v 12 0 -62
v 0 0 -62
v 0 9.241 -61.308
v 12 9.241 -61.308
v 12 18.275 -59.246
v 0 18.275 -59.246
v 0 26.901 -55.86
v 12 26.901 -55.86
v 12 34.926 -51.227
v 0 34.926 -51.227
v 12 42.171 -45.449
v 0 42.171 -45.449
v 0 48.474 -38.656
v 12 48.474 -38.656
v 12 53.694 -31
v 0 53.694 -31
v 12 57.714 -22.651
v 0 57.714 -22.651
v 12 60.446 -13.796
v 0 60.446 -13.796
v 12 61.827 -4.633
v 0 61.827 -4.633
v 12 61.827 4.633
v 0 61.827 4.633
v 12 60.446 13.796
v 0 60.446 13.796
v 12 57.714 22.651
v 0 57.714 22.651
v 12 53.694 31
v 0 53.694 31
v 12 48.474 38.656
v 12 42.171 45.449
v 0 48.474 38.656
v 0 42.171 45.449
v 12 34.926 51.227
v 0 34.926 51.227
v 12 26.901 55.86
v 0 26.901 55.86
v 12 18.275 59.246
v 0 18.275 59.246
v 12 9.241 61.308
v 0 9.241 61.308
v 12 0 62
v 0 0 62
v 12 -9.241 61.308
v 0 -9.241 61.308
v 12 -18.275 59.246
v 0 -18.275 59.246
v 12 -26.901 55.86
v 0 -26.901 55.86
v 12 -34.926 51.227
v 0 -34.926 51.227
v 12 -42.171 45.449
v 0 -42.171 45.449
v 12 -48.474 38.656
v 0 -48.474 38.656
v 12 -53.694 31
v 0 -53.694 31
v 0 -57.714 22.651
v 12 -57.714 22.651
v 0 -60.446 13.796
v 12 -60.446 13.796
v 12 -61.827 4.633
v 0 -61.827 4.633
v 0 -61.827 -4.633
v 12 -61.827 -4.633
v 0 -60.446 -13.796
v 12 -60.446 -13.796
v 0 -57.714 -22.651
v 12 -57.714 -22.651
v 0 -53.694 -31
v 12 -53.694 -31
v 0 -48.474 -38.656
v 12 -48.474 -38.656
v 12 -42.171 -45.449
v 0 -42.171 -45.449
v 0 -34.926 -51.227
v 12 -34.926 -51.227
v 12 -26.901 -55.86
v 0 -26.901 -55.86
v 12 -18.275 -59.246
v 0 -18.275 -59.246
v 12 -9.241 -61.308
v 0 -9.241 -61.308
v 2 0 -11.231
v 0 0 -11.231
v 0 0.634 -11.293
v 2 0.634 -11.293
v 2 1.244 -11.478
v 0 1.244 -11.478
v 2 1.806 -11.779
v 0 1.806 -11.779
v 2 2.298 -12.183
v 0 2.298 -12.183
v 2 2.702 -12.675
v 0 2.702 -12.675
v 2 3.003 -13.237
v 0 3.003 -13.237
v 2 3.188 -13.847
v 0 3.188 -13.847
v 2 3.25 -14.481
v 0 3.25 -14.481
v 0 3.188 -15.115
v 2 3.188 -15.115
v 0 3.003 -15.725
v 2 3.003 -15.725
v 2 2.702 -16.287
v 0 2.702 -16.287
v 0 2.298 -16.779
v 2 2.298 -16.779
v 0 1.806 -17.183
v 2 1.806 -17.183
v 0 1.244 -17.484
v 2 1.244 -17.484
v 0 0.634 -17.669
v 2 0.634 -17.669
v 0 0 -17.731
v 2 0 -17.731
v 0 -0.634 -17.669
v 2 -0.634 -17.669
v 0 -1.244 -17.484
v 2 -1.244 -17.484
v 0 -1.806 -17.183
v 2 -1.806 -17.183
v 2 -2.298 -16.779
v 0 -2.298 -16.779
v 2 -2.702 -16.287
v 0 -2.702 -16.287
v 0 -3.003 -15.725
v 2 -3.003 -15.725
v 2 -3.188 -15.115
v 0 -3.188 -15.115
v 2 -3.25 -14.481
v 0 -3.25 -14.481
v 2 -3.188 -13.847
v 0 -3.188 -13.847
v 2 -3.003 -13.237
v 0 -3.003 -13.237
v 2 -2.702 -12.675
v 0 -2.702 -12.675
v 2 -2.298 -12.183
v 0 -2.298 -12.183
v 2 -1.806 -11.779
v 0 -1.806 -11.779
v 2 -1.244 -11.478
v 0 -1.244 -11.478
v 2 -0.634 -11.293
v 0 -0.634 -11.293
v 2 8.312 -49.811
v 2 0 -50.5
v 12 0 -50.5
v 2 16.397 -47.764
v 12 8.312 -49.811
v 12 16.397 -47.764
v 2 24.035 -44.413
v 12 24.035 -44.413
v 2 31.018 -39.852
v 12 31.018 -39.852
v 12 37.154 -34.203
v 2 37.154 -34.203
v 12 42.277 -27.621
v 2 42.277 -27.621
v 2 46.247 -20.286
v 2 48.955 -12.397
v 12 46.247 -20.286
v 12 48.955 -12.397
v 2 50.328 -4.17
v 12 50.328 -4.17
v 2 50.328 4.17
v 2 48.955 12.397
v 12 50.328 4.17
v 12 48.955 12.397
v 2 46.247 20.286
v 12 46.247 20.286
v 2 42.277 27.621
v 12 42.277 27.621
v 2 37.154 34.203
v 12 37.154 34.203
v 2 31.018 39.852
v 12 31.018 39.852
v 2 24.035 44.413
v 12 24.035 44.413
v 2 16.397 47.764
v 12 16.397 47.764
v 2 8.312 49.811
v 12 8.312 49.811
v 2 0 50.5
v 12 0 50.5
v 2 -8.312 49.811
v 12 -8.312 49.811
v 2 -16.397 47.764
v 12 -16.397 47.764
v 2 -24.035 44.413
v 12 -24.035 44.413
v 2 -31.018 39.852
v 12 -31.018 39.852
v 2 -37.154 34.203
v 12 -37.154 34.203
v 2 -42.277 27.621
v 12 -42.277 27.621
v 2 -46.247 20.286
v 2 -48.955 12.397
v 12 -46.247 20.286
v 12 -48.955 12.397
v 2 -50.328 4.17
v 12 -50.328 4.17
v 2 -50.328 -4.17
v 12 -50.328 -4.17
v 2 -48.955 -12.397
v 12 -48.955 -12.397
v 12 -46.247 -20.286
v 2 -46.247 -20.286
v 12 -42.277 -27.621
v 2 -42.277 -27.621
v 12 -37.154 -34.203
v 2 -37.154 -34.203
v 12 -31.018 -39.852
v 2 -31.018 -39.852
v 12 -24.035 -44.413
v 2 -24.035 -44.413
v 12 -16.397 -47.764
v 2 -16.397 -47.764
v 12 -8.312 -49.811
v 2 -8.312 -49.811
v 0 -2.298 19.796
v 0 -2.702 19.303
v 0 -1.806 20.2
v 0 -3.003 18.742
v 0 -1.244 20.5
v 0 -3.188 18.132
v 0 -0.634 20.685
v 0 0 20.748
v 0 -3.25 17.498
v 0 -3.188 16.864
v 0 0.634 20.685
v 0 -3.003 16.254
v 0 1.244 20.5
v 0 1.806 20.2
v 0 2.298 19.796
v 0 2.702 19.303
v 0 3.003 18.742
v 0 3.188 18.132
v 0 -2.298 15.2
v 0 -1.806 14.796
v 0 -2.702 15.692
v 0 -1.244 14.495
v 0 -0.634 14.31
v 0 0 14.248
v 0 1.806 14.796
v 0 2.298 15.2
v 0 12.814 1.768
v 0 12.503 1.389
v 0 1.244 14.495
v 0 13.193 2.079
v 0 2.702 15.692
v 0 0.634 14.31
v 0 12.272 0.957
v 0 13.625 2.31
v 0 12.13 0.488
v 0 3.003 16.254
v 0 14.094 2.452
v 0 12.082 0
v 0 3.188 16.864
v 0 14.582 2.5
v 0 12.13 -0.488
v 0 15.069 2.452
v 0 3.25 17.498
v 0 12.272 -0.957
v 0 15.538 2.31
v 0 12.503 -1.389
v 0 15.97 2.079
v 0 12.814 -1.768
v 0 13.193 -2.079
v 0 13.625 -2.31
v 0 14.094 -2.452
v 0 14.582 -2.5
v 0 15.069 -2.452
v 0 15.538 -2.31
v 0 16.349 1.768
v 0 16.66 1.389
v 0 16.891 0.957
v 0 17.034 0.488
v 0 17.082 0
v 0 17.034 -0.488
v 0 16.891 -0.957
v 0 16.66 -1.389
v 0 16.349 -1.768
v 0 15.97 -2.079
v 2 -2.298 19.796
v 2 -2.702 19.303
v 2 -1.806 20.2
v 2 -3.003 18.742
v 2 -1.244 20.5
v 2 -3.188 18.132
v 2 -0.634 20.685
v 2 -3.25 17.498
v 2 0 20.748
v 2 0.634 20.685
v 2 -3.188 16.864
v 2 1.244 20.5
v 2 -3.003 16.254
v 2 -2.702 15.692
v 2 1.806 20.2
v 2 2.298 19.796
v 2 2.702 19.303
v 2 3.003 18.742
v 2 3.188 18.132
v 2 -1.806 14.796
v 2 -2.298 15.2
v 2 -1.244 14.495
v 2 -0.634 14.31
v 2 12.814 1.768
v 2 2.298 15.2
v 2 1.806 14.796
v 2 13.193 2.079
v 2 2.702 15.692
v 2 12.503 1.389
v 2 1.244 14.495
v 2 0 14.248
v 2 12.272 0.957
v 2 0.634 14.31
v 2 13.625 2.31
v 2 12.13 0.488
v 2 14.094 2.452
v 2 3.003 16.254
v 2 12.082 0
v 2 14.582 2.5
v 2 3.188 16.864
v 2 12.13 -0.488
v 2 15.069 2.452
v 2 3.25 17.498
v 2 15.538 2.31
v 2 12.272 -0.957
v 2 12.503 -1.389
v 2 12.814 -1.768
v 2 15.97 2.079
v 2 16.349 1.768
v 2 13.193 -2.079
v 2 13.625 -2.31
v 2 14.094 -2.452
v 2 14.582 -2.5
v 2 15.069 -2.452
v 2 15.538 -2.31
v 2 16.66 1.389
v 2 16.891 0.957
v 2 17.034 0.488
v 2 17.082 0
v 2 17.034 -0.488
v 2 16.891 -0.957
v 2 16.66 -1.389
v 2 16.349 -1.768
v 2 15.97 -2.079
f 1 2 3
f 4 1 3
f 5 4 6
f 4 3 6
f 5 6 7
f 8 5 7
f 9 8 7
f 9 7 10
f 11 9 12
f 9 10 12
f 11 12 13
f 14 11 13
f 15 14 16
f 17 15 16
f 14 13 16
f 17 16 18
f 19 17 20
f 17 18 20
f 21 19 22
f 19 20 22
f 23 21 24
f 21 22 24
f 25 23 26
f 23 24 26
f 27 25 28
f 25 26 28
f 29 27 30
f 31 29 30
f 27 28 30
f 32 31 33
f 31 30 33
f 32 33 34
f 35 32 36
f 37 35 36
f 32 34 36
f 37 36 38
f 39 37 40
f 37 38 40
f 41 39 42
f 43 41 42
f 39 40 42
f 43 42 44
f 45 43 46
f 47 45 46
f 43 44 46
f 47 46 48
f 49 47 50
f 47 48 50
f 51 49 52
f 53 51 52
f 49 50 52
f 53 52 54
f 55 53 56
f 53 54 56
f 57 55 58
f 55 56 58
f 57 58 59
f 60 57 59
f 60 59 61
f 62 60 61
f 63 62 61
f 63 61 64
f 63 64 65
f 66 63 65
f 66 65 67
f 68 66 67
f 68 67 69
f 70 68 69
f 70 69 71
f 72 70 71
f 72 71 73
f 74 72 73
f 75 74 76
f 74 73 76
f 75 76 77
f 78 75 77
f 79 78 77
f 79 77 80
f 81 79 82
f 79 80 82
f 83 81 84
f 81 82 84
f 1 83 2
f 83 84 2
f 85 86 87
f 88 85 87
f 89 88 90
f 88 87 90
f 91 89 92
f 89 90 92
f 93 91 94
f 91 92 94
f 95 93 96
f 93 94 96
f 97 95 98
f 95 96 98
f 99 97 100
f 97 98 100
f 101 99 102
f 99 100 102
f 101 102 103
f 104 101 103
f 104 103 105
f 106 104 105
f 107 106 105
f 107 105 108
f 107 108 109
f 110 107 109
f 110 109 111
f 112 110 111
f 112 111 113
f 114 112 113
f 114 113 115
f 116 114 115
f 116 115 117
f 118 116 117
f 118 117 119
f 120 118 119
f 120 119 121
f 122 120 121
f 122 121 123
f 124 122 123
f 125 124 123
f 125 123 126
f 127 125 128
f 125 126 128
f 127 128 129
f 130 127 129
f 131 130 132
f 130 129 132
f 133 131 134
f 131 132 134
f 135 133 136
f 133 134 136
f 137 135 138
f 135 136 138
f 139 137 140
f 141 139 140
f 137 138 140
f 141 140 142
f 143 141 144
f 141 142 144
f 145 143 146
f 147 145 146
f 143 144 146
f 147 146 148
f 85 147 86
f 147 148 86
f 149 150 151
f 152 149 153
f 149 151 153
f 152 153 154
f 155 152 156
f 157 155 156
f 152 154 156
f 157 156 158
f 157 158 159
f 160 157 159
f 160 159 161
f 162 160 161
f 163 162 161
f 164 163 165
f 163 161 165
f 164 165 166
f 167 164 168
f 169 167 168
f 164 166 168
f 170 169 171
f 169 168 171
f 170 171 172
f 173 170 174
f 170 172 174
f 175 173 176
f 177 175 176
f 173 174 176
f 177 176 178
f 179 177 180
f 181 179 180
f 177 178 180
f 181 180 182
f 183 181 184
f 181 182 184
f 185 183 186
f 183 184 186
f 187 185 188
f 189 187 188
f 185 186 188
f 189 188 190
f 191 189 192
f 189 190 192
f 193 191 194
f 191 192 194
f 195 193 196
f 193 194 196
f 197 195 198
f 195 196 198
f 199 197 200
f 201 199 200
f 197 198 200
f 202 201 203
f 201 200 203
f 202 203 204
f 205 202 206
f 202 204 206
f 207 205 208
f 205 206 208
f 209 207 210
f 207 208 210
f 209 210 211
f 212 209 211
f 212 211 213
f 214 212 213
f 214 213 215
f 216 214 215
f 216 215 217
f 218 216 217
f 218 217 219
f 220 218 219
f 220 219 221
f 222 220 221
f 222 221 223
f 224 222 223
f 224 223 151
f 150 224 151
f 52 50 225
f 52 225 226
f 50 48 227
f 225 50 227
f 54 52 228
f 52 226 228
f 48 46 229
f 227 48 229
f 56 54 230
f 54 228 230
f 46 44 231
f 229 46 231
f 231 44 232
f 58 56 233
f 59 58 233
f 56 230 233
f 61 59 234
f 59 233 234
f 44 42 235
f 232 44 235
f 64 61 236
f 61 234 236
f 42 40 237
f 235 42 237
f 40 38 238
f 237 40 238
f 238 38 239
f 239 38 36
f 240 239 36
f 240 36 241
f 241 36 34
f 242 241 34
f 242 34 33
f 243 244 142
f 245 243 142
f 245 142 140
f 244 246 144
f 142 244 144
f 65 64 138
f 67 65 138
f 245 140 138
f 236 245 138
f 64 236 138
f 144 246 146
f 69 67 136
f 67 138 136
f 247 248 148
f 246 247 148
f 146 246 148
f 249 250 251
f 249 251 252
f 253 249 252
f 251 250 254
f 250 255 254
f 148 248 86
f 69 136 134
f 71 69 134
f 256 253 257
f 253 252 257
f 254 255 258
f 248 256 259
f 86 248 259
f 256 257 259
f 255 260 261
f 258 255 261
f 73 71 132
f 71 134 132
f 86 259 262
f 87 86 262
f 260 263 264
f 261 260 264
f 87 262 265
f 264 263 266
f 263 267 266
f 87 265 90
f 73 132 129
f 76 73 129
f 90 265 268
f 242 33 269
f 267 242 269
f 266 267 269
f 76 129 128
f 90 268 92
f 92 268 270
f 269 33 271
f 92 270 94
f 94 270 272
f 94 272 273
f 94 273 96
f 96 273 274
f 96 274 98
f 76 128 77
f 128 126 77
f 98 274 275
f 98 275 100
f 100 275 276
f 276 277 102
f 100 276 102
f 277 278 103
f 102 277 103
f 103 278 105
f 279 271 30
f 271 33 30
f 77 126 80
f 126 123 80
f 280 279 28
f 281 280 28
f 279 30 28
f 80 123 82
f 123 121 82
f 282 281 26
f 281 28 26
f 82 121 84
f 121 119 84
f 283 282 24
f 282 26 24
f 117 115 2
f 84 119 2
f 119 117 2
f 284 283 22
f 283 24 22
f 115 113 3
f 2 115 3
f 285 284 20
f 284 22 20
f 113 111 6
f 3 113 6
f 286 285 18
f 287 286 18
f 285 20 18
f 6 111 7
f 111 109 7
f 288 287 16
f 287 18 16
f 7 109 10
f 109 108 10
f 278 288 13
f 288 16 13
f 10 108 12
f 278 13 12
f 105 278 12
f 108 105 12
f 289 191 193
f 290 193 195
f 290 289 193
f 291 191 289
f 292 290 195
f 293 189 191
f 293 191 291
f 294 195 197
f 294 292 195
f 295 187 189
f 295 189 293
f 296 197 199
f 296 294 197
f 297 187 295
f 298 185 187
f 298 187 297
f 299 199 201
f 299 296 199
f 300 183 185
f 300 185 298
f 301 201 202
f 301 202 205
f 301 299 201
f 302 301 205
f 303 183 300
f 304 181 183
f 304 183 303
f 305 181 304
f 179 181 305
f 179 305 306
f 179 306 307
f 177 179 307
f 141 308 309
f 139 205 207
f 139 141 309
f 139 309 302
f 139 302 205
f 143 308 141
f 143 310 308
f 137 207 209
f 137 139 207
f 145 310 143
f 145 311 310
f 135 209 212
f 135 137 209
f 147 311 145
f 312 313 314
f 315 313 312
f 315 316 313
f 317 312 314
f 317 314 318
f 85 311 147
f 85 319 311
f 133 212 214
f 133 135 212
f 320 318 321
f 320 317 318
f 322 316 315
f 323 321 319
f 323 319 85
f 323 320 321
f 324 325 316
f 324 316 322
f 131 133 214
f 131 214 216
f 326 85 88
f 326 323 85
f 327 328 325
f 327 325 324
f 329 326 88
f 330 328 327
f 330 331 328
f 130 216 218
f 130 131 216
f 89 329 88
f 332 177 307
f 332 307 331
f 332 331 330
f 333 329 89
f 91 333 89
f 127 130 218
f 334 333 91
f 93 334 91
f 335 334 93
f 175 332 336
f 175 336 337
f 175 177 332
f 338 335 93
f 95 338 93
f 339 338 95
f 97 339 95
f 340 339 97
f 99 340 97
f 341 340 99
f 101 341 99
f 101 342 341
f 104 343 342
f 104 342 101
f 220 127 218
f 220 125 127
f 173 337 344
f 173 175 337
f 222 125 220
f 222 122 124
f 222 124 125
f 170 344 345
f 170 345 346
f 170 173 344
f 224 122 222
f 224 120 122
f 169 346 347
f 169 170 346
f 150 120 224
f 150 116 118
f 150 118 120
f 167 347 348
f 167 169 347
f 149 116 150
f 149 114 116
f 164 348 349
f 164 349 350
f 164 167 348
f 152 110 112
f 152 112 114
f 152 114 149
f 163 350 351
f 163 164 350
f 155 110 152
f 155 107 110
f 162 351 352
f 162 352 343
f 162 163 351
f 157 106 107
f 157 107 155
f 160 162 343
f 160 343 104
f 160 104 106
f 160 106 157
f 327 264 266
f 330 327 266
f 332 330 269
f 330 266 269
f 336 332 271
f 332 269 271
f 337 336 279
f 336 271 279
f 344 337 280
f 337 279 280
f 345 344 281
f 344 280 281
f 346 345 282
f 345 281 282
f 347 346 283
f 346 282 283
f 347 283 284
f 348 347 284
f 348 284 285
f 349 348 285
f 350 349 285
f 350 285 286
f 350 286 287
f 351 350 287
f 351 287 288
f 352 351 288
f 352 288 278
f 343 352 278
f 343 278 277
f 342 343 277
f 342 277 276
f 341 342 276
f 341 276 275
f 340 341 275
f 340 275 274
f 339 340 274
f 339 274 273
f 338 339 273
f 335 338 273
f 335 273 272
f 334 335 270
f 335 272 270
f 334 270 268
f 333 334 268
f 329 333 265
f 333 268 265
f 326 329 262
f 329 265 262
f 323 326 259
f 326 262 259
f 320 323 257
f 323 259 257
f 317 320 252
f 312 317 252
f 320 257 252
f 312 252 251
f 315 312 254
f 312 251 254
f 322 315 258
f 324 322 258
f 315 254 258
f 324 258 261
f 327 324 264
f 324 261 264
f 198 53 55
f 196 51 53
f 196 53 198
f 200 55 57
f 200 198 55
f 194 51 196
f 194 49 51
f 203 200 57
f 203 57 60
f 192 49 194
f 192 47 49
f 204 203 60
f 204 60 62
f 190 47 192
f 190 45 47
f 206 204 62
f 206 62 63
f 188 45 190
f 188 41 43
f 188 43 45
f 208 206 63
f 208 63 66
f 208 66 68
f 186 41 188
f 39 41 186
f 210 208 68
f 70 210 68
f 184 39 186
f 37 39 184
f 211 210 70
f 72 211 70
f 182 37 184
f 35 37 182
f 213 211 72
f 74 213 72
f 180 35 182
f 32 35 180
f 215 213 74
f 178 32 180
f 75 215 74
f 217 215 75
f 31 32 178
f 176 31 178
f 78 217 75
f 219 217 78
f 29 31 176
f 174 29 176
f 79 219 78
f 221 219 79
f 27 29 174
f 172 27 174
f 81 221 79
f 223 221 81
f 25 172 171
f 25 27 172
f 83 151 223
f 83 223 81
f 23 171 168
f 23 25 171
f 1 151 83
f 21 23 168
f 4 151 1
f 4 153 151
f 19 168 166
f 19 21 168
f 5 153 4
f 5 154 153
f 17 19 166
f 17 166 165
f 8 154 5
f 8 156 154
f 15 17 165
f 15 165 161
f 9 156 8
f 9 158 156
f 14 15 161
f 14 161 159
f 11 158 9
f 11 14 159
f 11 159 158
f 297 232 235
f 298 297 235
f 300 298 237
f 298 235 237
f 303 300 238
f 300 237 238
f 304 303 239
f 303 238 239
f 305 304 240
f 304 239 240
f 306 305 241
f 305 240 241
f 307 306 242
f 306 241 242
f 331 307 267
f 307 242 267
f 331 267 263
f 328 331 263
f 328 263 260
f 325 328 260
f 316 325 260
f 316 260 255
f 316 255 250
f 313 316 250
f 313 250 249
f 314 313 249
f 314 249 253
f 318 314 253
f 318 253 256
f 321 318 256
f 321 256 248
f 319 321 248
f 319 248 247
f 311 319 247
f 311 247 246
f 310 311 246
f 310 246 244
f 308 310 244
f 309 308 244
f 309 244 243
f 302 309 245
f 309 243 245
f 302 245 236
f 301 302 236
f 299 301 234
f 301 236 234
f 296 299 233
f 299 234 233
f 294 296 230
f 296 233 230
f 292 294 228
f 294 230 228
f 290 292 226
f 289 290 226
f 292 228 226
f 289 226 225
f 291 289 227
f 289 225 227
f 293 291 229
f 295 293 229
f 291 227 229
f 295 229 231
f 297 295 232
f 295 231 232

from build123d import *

# Parameters (mm, degrees)
SKETCH2_R           = 62
BOSS_EXTRUDE1_DEPTH = 12
SKETCH4_R           = 50.5
CUT_EXTRUDE2_DEPTH  = 10
SKETCH5_R           = 2.5
SKETCH5_R_2         = 3.25
CUT_EXTRUDE3_DEPTH  = 5


with BuildPart() as part:
    # Sketch2 → Boss-Extrude1 (new body)
    with BuildSketch(Plane(origin=(0, 0, 0), x_dir=(0, 0, -1), z_dir=(1, 0, 0))):
        Circle(SKETCH2_R)
    extrude(amount=BOSS_EXTRUDE1_DEPTH)

    # Sketch4 → Cut-Extrude2 (cut)
    with BuildSketch(Plane(origin=(12, 0, 0), x_dir=(0, 0, -1), z_dir=(1, 0, 0))):
        Circle(SKETCH4_R)
    extrude(amount=-CUT_EXTRUDE2_DEPTH, mode=Mode.SUBTRACT)

    # Sketch5 → Cut-Extrude3 (cut)
    with BuildSketch(Plane.ZY):
        with Locations((0, 14.581539196)):
            Circle(SKETCH5_R)
        with Locations((-14.480976857, 0)):
            Circle(SKETCH5_R_2)
        with Locations((17.497847035, 0)):
            Circle(SKETCH5_R_2)
    extrude(amount=-CUT_EXTRUDE3_DEPTH, mode=Mode.SUBTRACT)


solid = part.part
